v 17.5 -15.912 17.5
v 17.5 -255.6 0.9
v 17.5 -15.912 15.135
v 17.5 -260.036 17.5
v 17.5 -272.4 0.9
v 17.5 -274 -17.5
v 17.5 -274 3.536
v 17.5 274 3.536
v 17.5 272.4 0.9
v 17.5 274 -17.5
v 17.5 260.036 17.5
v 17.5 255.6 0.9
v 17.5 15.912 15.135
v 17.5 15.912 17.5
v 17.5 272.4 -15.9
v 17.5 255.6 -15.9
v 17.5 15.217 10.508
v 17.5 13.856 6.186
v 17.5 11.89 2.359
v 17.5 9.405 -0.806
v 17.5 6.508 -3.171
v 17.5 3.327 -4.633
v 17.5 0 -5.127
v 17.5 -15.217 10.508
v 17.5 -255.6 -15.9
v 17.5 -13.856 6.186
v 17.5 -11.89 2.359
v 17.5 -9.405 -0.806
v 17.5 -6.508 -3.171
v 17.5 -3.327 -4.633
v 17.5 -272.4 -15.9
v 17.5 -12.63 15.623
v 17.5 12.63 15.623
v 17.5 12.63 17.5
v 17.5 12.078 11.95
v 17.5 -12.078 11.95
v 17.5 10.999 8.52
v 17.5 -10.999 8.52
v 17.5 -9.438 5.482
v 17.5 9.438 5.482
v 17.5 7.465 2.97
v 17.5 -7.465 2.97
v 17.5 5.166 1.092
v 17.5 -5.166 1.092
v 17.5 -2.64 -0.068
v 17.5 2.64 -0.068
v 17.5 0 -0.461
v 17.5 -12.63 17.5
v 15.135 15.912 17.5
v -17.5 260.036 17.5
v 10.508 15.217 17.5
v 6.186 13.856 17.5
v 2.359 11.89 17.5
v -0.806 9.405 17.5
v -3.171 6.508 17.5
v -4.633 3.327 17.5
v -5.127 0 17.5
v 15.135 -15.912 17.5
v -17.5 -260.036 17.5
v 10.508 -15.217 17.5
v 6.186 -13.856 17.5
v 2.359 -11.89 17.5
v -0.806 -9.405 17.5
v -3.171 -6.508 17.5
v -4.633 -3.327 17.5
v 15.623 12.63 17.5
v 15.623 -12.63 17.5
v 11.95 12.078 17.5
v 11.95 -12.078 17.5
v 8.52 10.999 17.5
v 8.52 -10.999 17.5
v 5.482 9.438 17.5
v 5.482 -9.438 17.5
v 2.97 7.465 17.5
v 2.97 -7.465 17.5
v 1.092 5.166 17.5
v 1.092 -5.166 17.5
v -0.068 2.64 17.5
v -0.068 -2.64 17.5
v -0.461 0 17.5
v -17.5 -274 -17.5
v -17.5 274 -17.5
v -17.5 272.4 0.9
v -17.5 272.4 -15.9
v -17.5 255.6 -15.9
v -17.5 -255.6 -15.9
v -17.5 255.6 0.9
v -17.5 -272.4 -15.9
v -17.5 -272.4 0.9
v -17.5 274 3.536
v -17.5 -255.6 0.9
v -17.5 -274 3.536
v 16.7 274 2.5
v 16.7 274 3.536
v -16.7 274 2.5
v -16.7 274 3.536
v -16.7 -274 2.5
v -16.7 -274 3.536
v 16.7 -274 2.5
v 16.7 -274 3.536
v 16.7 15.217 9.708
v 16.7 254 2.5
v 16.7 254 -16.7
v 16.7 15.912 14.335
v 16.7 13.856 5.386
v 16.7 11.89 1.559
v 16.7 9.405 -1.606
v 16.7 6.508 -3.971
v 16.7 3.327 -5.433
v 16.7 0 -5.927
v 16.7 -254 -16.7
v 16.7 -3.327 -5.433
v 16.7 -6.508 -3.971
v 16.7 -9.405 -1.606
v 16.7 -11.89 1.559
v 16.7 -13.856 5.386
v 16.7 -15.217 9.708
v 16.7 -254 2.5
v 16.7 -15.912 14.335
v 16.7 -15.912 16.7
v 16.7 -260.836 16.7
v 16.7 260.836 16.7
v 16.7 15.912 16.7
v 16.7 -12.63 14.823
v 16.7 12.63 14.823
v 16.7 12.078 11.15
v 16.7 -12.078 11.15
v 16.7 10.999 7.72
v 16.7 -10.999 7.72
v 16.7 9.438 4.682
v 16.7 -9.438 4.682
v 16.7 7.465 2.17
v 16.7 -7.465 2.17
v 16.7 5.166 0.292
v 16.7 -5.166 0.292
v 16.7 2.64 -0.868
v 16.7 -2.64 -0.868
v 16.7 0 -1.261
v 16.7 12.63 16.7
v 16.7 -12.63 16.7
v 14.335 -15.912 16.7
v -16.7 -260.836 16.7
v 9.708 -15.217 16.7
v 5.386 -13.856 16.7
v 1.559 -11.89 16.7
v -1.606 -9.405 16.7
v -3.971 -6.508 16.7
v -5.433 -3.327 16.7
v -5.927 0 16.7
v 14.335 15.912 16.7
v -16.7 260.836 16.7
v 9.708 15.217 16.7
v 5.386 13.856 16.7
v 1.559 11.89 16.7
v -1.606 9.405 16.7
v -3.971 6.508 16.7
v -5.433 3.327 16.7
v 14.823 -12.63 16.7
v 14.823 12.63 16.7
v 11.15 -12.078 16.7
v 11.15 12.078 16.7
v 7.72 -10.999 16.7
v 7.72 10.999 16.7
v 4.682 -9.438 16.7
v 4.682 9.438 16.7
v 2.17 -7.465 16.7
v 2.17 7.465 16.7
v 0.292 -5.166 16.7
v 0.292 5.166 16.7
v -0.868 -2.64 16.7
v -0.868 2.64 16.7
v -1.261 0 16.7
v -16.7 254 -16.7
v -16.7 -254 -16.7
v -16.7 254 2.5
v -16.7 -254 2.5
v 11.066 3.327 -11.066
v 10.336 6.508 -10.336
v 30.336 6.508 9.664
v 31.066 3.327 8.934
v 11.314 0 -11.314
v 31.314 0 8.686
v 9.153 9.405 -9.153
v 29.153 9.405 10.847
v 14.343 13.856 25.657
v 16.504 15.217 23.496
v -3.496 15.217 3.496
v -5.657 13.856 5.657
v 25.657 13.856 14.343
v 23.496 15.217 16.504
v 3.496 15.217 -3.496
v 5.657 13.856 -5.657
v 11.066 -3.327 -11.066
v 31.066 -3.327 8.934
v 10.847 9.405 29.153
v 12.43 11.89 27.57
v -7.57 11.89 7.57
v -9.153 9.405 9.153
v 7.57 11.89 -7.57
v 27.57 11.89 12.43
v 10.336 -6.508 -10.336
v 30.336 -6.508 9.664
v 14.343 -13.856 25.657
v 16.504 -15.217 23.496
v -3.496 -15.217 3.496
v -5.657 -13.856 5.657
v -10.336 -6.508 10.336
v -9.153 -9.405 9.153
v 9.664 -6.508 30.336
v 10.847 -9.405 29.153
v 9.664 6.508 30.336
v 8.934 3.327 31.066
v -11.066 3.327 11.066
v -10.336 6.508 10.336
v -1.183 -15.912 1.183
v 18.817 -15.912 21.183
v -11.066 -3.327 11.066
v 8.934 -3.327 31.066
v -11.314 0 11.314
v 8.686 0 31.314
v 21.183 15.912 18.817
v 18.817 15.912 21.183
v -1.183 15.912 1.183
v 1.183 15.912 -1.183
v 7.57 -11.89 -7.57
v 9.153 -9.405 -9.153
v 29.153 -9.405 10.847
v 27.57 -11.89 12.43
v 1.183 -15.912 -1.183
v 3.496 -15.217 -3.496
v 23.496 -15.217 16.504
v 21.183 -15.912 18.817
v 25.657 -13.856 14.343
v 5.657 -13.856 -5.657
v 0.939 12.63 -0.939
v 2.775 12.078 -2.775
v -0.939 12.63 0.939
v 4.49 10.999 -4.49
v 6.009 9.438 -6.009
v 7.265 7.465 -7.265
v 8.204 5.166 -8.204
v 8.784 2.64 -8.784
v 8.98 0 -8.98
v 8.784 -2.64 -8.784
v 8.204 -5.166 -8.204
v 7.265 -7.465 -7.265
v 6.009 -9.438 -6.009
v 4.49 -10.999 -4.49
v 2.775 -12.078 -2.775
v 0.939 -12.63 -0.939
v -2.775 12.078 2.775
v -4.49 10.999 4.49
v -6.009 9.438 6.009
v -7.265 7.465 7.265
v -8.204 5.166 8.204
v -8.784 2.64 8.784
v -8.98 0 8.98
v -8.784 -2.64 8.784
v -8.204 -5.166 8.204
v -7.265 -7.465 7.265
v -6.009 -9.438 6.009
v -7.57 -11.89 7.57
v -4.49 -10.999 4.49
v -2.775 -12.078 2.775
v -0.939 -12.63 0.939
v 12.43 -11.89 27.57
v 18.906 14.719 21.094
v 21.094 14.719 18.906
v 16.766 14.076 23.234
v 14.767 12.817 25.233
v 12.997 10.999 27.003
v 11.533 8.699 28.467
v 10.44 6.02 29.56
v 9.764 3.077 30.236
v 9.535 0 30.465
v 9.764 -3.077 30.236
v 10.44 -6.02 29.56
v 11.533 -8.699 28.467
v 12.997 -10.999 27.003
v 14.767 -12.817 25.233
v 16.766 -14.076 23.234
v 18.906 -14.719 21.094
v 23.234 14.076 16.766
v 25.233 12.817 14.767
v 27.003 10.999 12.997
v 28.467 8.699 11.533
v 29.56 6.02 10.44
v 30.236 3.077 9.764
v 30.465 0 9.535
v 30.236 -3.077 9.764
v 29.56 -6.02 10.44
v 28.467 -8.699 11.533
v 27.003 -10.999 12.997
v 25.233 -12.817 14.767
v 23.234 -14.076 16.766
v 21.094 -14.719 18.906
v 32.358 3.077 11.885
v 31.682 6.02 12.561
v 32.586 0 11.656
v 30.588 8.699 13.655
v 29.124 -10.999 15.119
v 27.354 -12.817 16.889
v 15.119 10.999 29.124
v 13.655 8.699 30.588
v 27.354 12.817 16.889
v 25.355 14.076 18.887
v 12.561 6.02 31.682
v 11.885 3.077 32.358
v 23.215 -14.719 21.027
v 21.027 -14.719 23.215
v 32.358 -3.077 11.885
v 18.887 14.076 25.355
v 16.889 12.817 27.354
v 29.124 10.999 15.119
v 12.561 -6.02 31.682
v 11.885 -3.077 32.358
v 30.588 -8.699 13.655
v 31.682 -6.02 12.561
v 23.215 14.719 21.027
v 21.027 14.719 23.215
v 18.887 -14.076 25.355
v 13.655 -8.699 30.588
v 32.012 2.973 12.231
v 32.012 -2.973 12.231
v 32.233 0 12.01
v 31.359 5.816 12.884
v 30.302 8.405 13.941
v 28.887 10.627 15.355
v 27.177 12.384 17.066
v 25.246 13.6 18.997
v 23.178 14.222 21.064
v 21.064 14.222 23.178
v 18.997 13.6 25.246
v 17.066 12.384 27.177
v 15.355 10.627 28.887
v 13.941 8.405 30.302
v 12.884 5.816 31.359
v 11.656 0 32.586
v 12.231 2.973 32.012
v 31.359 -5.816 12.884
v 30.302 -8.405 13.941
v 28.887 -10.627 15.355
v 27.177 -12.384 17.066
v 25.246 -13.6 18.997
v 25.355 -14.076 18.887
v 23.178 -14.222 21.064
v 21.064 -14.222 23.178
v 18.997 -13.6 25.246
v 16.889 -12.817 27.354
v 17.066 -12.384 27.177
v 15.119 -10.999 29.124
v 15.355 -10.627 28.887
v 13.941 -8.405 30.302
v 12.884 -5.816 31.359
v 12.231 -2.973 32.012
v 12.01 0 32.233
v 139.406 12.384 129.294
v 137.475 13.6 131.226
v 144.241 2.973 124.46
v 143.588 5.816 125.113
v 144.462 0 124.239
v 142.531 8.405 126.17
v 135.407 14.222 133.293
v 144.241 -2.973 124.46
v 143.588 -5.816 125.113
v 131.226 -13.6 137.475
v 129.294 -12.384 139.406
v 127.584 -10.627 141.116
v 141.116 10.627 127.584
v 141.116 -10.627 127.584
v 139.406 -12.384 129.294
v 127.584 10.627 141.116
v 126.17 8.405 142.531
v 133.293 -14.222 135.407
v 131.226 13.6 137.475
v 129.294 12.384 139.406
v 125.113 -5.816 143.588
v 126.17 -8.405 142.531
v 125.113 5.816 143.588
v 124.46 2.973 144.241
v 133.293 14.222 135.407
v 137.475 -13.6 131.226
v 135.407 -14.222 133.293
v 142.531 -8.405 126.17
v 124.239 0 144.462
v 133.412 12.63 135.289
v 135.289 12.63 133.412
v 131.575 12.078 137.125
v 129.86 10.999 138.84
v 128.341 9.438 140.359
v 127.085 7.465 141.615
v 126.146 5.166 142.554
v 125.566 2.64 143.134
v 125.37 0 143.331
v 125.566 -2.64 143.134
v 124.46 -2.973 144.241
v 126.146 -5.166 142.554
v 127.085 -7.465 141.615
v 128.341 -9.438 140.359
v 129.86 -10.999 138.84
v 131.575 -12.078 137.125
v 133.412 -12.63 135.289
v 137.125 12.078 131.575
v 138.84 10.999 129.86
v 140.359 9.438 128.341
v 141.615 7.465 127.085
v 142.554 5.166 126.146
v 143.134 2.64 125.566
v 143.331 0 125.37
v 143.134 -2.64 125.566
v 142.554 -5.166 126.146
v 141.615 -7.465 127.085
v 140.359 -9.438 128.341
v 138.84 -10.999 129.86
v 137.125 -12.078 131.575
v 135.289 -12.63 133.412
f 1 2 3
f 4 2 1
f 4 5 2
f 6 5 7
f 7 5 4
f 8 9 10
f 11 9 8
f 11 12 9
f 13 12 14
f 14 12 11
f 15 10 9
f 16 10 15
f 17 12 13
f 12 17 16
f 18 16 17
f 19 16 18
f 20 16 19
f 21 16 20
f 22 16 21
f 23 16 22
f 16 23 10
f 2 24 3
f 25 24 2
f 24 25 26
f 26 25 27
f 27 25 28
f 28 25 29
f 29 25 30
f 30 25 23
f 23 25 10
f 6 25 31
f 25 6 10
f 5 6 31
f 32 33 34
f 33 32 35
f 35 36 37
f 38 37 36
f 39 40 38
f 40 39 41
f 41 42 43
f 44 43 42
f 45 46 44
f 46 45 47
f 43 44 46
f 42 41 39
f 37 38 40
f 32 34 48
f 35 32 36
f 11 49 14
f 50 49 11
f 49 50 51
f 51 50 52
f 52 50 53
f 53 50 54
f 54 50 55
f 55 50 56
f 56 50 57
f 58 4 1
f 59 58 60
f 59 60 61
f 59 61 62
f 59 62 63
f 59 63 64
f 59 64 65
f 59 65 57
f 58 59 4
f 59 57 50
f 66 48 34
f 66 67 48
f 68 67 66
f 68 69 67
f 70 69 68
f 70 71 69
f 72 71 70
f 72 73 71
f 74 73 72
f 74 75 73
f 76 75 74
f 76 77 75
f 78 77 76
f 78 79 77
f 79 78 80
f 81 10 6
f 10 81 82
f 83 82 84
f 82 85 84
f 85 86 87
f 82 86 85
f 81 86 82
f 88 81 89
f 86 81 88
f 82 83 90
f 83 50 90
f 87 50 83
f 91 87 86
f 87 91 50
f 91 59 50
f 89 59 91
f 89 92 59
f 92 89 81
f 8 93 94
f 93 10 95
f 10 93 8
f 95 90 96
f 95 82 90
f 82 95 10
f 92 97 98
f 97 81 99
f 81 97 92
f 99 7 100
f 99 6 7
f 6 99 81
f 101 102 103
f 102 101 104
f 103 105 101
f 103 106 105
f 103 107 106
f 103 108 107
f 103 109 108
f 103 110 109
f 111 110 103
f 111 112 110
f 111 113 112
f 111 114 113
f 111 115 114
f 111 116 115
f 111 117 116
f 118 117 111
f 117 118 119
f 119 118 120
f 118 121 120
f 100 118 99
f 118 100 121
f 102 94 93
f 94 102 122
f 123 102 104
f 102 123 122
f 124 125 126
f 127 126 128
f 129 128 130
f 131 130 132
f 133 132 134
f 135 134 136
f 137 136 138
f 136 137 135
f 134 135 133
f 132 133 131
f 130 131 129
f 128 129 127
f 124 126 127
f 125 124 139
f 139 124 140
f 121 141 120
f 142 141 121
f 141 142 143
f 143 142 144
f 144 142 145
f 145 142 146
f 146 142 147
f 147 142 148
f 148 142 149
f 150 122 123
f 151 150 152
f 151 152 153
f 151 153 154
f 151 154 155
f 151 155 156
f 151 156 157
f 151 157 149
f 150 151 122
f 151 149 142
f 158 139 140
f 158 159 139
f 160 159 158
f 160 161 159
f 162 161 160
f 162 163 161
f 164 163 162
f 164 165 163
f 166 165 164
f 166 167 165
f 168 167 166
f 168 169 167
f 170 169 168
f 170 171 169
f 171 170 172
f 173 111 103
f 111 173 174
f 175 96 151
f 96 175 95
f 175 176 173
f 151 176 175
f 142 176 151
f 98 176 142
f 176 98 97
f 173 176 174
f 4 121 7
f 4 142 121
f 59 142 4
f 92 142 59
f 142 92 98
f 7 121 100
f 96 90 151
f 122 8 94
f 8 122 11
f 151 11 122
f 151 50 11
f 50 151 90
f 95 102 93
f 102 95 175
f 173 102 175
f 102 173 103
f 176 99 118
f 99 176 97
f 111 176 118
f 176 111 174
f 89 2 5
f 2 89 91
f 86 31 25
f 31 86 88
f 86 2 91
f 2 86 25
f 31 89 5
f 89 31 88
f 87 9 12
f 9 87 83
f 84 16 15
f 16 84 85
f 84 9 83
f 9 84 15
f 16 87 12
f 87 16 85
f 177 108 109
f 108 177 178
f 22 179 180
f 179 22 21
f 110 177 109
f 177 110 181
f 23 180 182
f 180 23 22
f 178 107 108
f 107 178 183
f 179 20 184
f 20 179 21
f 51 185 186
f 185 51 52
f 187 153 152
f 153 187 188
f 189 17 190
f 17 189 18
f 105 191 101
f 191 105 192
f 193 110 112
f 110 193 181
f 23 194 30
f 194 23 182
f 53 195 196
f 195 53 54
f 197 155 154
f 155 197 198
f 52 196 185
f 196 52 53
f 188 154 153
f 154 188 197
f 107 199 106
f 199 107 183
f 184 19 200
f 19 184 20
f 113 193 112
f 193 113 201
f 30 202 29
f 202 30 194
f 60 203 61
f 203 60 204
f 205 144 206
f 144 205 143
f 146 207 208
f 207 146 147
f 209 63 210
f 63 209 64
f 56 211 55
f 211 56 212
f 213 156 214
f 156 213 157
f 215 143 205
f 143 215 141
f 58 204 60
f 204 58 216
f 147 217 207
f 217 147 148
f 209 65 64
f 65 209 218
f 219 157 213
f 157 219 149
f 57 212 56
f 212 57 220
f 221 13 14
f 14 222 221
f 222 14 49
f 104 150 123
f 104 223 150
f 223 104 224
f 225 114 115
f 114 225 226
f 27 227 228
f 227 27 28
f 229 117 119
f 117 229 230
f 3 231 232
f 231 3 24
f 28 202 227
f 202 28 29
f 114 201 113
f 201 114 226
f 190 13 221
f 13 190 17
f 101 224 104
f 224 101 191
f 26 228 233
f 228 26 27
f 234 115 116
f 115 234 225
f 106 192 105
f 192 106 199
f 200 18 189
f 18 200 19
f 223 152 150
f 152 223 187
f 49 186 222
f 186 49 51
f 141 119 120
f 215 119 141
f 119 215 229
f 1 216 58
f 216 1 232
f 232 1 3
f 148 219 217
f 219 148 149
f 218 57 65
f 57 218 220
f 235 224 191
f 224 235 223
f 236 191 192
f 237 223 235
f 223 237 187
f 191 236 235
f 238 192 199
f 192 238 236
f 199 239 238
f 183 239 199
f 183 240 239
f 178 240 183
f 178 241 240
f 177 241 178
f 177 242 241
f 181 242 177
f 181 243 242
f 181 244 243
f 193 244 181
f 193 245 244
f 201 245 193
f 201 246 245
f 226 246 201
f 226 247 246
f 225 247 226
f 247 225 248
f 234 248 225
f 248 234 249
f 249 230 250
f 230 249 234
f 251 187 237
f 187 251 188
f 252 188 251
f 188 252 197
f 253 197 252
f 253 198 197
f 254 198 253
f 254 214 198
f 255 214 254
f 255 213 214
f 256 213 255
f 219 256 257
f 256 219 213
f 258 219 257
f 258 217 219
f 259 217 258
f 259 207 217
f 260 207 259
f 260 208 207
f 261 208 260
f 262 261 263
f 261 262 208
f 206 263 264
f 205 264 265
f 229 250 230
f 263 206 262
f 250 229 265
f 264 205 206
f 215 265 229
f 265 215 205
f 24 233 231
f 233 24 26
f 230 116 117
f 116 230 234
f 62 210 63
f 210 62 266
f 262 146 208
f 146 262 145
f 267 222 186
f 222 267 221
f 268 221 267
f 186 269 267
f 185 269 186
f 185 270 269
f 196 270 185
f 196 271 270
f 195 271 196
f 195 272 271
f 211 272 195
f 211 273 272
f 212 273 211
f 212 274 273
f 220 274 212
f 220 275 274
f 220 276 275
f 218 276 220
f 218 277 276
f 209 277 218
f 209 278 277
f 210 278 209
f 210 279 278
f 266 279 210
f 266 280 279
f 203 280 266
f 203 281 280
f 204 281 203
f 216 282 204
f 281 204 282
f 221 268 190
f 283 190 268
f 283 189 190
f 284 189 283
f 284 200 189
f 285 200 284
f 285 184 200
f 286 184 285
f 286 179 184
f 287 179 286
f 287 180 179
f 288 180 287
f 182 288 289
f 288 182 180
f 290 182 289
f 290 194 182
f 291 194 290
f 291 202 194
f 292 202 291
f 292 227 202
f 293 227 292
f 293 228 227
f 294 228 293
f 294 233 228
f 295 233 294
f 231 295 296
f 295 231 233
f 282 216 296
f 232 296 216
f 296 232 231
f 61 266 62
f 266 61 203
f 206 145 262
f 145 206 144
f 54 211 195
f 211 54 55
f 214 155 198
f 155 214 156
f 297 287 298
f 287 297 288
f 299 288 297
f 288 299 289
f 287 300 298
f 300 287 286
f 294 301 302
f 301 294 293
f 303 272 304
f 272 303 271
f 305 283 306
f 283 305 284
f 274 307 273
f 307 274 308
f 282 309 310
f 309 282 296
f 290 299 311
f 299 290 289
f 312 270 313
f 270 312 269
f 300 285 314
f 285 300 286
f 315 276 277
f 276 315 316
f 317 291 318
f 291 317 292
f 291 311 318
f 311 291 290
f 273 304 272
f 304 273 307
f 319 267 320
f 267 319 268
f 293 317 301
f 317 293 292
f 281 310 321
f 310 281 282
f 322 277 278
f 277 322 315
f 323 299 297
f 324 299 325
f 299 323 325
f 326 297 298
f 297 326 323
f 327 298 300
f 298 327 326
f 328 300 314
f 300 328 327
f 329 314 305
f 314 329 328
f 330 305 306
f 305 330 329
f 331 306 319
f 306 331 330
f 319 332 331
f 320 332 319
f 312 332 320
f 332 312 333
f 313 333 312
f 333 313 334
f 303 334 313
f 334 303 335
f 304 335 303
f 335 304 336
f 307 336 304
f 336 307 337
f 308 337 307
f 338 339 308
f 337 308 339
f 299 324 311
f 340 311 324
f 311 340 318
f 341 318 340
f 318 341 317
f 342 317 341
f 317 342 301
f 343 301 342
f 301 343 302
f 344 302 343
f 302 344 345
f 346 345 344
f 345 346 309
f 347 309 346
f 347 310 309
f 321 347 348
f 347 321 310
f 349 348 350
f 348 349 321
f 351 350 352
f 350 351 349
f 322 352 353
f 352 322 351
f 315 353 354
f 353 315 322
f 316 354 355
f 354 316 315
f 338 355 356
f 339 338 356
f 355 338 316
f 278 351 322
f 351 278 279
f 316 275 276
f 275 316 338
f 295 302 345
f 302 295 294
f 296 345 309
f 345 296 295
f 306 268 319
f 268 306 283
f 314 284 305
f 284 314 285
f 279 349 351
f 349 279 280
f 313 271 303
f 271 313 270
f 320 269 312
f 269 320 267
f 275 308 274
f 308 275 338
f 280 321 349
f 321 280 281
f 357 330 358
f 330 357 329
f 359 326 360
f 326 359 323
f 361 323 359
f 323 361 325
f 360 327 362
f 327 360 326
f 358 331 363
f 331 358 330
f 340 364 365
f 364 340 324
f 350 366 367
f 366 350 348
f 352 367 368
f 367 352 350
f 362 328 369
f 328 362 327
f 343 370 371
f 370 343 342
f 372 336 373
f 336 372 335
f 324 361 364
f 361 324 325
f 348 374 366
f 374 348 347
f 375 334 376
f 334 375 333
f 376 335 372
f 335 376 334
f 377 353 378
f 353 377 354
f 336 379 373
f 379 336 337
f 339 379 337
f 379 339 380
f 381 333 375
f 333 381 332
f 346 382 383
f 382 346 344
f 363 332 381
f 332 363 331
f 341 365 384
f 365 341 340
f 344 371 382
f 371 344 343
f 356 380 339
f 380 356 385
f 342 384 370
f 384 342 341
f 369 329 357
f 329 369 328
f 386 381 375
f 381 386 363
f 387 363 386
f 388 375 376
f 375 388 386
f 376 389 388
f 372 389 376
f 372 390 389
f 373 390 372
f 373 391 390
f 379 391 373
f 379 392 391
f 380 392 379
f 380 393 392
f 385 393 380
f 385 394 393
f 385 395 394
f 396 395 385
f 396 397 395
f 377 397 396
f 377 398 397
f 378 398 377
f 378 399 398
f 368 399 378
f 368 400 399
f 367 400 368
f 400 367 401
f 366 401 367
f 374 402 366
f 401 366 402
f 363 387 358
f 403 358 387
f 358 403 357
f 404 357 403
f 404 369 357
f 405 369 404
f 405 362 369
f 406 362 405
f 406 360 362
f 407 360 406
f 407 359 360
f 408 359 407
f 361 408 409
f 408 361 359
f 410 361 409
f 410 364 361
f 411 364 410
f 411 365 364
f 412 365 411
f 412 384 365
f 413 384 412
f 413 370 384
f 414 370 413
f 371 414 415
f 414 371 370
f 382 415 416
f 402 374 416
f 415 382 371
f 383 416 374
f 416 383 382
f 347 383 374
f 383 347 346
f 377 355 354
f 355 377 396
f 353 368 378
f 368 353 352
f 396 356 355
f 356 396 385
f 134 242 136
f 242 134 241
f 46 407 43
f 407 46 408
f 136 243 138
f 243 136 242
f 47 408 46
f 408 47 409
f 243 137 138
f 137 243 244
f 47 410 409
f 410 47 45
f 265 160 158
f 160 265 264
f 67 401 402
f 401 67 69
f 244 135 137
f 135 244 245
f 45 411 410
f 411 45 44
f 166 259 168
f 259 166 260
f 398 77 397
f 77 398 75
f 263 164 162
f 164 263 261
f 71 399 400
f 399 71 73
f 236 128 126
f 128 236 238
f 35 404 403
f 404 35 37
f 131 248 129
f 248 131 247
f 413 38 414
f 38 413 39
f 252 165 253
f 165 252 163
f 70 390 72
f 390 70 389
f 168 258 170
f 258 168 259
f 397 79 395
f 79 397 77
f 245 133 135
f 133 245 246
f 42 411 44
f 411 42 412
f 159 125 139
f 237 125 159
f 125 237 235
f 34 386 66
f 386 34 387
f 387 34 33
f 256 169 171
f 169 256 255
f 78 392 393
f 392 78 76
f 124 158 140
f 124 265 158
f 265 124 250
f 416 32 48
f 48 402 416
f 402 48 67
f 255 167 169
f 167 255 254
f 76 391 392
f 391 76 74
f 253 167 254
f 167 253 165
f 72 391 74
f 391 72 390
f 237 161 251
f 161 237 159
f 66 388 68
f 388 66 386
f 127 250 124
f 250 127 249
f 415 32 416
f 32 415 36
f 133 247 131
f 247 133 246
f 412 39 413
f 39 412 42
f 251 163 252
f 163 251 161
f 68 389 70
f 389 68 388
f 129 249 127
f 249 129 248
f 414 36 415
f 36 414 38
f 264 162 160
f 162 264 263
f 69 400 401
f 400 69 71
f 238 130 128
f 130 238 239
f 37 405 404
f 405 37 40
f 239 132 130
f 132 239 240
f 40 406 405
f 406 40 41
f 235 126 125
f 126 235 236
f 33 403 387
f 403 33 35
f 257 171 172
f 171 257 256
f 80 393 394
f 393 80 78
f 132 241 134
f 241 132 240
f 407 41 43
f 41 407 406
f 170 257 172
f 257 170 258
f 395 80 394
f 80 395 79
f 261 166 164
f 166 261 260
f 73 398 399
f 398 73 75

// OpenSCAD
// file: hexagonalprism.scad
hex_prism(6.2,6);



module hex_prism(r,h){
    linear_extrude(height=h){
        hex(r);
    }
}

module hex(r){
    polygon(points = [[r,0],[r/2,r*sqrt(3)/2],
                [-r/2,r*sqrt(3)/2],[-r,0],
                [-r/2,-r*sqrt(3)/2],[r/2,-r*sqrt(3)/2]]);
}
// file: bolts.scad
use <hexagonalprism.scad>

bolt();

translate([30,0,0]) nut();

module kingpin(){
    bolt(d=12.7,l=75);
}

module bolt(d=12.7,l=62){
    rad = d/2;
    len = l;
    color("gray") hex_prism(2*rad,rad*1.4);
    color("silver") cylinder(r=rad,h=len);
}

module nut(d=12.7){
    rad = d/2;
    color("gray") difference(){
        hex_prism(2*rad,rad*1.4);
        color("silver") cylinder(r=rad,rad*1.4+2);
    }
}
// main file
use <./bolts.scad>

crossMember();
//translate([-34,-240,-8.5]) rotate([0,90,0]) kingpin();

module crossMember() color("lightblue"){
    xMemShell();
    translate([0,-264,-8.5]) kingBush();
    translate([0,264,-8.5]) kingBush();
    //translate([-19.5,277,0.5]) endcover();
    //translate([-19.5,-277,0.5]) mirror([0,1,0]) endcover();
    steerer();
}

module steerer() rotate([0,45,0]) difference(){
    union(){
        cylinder(r=16,h=20*sqrt(2));
        cylinder(r=14.8,h=20*sqrt(2)+3);
        cylinder(r=14.3,h=190);
    }
    translate([0,0,-1]) cylinder(r=12.7,h=192);
}

module endcover() translate([0,-2.9,2.8]) 
        rotate([45,0,0,]) cube([39,1.6,20]);

module kingBush(){
    translate([0,0,1]) difference(){
        cube([35,20,20],center=true);
        cube([37,16.8,16.8],center=true);
    }
}

module xMemShell() difference(){
    cube([35,548,35],center=true);
    cube([33.4,550,33.4],center=true);
    translate([-18,-274,5/sqrt(2)]) rotate([45,0,0]) cube([37,20,20]);
    translate([-18,274,5/sqrt(2)]) rotate([45,0,0]) cube([37,20,20]);
    translate([0,264,-7.5]) cube([50,20,20],center=true);
    translate([0,-264,-7.5]) cube([50,20,20],center=true);
}
